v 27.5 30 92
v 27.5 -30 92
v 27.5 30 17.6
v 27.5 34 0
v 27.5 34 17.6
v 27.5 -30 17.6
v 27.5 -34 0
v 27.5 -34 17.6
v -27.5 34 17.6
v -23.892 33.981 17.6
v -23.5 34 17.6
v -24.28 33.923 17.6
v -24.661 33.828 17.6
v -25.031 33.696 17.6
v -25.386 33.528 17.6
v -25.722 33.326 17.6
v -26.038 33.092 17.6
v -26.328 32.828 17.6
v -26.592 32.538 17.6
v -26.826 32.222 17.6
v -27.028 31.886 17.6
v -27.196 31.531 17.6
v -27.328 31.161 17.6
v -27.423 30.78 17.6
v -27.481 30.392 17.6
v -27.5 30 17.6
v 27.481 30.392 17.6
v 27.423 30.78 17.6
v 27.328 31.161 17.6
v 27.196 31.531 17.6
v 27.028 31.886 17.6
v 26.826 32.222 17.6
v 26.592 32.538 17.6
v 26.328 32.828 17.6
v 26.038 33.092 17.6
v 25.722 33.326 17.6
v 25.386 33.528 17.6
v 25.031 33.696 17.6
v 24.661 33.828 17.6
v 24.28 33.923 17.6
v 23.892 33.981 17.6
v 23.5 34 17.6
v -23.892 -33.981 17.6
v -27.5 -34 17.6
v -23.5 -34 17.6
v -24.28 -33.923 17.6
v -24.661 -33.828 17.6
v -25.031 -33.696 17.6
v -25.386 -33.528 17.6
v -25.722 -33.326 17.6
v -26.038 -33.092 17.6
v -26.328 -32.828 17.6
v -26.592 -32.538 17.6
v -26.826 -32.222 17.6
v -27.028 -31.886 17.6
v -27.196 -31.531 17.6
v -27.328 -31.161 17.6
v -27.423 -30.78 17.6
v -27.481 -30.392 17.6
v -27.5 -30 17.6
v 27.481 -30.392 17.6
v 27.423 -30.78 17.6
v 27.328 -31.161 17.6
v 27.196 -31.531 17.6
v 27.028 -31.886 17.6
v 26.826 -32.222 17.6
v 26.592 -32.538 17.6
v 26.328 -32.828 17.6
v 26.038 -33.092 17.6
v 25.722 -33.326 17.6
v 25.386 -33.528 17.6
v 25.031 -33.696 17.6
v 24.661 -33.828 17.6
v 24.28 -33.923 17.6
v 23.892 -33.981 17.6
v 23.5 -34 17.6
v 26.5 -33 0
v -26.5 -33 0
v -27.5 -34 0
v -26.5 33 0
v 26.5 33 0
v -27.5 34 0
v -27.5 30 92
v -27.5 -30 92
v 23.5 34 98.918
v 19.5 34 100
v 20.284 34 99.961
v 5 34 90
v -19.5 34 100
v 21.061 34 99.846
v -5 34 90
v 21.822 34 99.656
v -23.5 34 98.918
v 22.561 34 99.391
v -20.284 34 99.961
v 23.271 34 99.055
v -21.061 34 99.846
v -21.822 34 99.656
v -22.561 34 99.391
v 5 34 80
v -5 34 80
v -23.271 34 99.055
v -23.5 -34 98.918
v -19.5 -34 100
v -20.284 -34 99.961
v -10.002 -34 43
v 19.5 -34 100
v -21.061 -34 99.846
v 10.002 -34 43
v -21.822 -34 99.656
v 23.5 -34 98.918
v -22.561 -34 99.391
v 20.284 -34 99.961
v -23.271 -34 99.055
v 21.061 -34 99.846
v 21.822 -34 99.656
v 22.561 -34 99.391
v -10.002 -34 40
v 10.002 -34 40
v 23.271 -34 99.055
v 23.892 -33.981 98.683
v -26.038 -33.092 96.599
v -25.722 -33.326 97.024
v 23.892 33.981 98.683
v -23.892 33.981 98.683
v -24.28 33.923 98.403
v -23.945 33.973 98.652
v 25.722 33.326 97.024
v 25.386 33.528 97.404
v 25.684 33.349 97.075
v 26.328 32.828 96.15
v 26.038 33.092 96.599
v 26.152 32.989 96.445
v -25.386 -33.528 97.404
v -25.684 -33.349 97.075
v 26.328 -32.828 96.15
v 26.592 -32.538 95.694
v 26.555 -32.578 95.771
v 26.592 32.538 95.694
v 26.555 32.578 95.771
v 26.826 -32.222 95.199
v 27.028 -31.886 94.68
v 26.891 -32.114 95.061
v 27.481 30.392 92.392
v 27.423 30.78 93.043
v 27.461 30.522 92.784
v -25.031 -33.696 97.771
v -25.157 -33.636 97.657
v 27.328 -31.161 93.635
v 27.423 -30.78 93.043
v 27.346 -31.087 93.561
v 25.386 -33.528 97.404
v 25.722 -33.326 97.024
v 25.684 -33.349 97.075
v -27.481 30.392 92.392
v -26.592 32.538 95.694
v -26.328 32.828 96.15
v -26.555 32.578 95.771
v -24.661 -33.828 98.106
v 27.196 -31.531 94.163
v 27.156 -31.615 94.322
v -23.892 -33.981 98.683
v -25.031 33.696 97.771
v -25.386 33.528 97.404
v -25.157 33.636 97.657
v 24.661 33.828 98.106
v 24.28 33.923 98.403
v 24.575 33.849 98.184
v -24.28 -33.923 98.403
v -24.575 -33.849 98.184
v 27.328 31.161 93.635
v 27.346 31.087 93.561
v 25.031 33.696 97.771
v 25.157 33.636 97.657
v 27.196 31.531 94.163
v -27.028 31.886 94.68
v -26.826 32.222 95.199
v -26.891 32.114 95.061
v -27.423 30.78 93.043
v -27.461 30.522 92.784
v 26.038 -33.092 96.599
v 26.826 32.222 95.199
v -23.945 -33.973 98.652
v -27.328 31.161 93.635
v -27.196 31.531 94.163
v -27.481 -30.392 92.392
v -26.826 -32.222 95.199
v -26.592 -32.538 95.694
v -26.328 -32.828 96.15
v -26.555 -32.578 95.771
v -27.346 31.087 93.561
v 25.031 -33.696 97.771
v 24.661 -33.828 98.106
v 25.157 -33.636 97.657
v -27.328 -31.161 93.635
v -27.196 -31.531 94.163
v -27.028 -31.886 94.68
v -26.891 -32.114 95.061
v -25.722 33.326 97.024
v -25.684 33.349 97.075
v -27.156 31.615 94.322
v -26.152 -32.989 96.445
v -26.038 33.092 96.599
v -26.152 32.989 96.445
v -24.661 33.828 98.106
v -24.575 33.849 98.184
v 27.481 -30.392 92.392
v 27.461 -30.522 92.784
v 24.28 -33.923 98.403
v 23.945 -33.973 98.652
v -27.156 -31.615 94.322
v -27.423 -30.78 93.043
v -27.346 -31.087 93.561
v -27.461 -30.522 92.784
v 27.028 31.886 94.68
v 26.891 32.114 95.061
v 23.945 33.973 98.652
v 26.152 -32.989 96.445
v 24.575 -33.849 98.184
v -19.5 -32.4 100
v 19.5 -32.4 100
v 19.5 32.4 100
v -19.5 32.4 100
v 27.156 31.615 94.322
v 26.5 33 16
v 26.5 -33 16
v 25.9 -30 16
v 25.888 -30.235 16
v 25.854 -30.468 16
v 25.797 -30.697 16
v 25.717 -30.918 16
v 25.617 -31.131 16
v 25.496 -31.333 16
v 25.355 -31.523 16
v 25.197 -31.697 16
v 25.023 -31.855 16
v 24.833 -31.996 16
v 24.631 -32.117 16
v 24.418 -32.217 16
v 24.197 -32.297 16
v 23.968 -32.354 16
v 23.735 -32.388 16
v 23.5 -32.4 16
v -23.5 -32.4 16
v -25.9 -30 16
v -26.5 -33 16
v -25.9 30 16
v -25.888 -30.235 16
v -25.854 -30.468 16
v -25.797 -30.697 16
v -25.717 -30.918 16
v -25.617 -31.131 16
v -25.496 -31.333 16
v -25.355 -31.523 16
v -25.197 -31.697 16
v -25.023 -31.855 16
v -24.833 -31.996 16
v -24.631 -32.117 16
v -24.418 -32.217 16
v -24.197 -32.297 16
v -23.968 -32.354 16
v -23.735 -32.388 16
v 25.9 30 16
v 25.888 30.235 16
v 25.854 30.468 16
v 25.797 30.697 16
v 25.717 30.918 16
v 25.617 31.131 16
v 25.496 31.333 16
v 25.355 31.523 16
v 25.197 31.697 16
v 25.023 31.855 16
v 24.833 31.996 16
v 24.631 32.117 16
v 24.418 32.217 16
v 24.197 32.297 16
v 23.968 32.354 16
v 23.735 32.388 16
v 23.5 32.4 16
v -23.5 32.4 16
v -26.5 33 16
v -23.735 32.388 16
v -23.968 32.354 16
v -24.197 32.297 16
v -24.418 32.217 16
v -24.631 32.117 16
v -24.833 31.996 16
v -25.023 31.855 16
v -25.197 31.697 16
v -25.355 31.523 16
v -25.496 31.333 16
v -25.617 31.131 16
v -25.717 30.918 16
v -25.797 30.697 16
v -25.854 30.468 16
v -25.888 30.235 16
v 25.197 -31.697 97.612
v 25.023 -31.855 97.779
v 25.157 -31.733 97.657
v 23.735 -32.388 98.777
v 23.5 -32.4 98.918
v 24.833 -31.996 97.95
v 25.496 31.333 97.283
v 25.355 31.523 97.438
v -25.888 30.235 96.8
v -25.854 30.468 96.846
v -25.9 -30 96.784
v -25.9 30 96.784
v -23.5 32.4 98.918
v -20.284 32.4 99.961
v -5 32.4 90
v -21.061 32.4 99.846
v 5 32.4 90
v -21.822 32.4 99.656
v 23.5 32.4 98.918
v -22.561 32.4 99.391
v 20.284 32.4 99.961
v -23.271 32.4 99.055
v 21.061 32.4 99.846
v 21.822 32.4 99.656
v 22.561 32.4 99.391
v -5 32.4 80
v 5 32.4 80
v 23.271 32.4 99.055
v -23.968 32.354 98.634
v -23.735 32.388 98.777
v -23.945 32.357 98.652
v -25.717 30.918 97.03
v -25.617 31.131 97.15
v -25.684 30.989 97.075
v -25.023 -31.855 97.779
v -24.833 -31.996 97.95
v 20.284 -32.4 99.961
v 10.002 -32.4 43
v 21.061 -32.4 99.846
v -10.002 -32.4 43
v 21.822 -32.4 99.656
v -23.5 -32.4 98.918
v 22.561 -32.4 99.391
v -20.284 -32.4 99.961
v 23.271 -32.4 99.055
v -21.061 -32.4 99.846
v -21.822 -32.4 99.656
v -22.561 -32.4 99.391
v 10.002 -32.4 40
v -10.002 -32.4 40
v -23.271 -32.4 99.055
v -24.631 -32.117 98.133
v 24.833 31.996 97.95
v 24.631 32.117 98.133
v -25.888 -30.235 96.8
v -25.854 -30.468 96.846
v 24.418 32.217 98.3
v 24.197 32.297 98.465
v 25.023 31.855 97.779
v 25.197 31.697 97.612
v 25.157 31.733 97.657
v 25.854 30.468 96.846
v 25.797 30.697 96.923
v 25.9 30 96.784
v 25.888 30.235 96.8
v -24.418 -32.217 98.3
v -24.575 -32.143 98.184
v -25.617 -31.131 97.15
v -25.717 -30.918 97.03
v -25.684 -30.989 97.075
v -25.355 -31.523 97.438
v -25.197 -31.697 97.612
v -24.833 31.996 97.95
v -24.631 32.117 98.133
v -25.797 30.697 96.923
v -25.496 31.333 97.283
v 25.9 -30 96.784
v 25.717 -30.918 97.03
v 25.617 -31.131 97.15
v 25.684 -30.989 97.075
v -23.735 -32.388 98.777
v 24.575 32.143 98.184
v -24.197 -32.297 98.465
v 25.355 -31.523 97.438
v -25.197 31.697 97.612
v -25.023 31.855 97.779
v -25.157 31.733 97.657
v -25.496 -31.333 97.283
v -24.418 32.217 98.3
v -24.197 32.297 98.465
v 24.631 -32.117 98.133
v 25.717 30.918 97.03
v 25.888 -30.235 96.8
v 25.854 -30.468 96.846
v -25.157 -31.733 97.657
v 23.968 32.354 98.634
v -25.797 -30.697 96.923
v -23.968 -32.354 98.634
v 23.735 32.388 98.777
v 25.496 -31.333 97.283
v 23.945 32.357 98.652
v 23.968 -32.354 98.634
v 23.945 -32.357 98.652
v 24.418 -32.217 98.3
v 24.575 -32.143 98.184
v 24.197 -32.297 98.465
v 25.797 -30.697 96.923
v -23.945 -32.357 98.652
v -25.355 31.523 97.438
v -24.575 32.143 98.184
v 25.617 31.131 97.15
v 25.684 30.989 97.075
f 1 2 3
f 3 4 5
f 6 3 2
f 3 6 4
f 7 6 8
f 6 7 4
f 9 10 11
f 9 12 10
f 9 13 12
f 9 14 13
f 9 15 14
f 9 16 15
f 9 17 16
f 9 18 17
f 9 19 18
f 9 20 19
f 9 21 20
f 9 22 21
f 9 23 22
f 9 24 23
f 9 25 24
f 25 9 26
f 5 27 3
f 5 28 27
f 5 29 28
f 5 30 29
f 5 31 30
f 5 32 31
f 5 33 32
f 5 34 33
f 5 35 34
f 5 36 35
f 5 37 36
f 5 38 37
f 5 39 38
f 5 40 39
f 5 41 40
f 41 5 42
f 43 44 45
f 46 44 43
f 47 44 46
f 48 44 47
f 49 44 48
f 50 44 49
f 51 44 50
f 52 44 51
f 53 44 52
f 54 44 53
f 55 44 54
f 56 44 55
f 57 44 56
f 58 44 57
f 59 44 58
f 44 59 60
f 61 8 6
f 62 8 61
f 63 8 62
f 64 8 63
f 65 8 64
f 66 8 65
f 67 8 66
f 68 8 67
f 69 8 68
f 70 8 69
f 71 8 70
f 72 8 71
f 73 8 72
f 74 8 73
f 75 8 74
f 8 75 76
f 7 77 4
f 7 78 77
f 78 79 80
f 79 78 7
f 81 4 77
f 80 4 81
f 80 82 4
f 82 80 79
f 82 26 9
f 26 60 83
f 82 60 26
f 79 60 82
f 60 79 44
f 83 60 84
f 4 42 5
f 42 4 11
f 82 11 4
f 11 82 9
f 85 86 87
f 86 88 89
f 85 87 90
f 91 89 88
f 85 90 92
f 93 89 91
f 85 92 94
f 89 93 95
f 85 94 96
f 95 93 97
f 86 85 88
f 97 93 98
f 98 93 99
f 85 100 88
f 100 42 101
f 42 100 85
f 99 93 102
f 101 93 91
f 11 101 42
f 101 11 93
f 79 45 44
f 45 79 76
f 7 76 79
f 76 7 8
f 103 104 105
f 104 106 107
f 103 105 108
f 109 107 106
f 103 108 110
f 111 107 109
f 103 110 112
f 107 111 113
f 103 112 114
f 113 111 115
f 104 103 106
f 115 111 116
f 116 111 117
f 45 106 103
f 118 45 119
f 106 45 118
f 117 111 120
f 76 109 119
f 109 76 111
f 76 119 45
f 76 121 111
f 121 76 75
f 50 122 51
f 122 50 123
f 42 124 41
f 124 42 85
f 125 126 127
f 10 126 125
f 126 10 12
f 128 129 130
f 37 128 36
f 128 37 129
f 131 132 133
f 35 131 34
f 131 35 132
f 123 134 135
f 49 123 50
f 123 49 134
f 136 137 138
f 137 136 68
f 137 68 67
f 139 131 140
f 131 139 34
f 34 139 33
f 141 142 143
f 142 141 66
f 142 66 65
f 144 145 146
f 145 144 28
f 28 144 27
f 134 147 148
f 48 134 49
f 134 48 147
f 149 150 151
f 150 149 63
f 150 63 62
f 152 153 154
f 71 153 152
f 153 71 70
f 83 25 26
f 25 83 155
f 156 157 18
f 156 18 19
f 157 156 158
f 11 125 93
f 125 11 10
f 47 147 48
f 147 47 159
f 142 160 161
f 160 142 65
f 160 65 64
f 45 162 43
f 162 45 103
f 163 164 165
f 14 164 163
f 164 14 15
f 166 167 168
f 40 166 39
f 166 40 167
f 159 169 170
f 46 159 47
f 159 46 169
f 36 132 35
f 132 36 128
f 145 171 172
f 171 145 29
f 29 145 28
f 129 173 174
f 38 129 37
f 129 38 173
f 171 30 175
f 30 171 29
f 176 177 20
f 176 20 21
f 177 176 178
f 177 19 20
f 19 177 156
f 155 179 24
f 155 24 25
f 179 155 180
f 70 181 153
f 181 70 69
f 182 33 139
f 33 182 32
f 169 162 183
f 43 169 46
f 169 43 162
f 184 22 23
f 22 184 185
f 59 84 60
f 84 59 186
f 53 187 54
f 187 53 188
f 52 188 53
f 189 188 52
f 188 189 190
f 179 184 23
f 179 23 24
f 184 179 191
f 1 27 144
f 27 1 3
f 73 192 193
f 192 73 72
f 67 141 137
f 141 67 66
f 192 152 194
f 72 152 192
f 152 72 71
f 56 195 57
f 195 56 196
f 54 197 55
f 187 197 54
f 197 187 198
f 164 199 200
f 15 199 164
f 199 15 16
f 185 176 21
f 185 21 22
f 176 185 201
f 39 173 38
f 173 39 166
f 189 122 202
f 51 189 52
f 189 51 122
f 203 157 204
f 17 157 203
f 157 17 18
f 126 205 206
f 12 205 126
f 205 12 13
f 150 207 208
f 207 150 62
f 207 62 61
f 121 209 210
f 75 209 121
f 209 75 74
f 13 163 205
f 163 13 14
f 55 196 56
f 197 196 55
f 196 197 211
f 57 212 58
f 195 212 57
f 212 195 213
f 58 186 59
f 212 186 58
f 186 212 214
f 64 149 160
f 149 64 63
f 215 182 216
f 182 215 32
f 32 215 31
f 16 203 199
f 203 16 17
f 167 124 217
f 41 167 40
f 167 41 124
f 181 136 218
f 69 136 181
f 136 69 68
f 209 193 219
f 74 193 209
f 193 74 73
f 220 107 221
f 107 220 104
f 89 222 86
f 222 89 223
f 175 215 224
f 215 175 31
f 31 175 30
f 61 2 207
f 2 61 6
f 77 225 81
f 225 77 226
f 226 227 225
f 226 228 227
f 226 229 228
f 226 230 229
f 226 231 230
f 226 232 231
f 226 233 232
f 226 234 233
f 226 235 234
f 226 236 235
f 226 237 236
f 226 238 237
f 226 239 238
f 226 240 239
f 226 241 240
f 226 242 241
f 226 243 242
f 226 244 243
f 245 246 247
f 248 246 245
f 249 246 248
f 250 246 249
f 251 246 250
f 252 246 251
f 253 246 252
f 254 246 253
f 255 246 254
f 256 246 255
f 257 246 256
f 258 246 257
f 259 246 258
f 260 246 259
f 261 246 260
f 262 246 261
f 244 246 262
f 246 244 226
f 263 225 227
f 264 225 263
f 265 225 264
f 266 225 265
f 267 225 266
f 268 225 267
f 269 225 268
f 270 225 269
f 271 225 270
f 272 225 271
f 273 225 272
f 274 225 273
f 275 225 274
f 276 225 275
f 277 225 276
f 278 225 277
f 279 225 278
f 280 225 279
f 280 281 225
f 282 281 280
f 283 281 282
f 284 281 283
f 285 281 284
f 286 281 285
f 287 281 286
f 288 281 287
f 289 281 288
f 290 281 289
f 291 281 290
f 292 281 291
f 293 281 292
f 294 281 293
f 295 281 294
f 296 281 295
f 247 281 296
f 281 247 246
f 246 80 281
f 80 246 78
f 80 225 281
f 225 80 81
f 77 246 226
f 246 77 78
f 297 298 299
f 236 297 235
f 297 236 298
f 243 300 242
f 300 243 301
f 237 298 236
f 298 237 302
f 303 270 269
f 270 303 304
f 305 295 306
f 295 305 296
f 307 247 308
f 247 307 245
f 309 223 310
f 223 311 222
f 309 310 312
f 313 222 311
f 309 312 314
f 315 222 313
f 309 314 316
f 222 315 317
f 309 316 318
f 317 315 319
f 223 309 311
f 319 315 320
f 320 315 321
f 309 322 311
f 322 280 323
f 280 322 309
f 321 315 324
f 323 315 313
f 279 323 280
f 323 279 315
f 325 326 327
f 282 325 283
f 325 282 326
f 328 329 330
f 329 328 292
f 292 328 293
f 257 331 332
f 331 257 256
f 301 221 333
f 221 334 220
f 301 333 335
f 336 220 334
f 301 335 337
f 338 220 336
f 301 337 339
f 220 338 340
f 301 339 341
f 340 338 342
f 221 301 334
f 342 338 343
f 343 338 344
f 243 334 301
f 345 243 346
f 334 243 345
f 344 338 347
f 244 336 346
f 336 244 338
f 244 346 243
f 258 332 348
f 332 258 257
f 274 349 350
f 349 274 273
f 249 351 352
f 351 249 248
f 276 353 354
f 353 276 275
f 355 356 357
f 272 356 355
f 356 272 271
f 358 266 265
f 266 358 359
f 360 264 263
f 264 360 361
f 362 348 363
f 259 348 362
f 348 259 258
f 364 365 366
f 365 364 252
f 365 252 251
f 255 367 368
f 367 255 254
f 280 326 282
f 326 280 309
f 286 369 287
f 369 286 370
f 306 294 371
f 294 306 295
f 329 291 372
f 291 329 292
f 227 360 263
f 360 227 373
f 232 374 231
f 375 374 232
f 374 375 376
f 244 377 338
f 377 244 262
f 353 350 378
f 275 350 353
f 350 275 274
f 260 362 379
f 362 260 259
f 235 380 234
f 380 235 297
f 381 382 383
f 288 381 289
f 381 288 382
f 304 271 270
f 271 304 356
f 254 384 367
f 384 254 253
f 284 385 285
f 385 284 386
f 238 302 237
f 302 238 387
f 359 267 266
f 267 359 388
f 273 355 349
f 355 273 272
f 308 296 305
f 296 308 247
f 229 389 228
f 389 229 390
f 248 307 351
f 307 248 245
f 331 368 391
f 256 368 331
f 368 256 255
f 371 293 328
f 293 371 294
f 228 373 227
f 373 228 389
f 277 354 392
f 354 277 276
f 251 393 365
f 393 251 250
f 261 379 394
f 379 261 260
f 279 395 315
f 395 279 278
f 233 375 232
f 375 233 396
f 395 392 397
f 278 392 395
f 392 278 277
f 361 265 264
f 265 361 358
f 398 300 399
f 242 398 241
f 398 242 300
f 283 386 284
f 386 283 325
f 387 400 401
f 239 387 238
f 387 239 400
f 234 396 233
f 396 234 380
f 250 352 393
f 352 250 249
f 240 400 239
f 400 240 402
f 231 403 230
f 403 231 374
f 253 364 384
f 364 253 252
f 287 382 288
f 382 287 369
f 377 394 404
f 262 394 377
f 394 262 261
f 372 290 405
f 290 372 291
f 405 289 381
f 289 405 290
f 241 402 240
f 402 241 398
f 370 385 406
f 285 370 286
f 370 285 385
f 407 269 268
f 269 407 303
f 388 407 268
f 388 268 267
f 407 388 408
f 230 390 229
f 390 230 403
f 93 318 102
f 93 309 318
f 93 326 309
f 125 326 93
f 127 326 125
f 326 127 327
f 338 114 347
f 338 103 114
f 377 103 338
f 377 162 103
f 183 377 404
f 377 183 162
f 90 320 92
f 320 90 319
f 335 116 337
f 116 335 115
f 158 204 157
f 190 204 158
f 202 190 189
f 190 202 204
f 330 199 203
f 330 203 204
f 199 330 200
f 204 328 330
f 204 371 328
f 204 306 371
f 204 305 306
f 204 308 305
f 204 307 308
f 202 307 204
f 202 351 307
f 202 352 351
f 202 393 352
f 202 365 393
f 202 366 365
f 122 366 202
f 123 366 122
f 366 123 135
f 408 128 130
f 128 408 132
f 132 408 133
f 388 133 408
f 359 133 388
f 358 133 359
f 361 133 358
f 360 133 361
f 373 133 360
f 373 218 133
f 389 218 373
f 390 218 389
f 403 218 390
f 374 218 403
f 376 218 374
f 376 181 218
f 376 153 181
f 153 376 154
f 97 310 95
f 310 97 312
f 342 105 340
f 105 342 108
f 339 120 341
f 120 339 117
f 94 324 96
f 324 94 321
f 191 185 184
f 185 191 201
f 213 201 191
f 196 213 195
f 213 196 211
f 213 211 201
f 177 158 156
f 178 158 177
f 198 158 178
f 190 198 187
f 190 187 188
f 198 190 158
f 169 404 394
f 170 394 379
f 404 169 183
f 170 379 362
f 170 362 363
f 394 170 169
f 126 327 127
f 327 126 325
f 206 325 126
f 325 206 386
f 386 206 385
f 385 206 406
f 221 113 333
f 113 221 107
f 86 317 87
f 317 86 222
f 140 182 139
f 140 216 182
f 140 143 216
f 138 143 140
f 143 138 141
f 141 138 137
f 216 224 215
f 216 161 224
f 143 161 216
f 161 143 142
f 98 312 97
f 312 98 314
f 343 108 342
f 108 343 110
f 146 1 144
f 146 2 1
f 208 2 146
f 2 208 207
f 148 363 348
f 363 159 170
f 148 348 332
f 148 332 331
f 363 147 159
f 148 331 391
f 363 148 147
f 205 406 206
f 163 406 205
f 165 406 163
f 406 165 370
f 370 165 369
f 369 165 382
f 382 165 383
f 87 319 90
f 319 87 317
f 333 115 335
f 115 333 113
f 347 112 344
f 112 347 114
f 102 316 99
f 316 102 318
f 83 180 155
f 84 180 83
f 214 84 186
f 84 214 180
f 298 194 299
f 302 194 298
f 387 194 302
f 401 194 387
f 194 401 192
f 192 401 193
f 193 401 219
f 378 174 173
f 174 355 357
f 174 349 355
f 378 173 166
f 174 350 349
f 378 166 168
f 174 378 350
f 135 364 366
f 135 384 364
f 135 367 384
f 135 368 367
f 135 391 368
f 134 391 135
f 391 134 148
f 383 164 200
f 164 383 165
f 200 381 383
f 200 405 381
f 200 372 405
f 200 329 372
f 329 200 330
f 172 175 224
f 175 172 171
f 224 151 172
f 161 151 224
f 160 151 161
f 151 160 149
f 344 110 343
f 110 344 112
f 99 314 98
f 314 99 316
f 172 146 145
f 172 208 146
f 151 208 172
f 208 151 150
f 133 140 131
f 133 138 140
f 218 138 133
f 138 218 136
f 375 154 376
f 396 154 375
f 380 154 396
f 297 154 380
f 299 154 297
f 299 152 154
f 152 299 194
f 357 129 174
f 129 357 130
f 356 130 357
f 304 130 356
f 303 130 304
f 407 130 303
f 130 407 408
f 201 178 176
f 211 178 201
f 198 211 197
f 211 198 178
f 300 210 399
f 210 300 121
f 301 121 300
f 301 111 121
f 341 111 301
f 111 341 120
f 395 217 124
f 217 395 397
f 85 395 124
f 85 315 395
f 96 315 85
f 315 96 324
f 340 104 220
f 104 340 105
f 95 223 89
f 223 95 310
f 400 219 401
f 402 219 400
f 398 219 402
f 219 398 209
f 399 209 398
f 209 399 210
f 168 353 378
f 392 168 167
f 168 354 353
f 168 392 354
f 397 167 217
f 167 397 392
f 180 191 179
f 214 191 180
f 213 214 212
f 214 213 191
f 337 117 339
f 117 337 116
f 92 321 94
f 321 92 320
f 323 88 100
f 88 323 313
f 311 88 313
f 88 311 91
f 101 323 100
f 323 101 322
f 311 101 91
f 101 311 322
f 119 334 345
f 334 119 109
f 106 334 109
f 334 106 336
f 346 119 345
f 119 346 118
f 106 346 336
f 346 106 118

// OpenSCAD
// Open-top body alternative, millimetres. Front = -Y, rear = +Y.
// The original 50 mm body plus the requested 50 mm raised rim totals 100 mm.
width = 55;
depth = 68;
body_height = 50;
rim_height = 50;
height = body_height + rim_height;
wall = 1.6;
base_wall = 1;
base_band = 16;
corner_radius = 4;
top_corner_radius = 8;
usb_size = 10;
usb_top_offset = 10;
oled_slot_width = 20.005;
oled_slot_height = 3;
oled_slot_z = 40;
$fn = 64;

module rounded_rectangle(w, d, r) {
    offset(r=r) square([w-2*r, d-2*r], center=true);
}

// Rounded upper corners seen from the face; sides remain vertical below them.
module crown_profile() {
    translate([0,depth/2+1,0]) rotate([90,0,0])
        linear_extrude(height=depth+2)
            hull() {
                translate([-width/2,0]) square([width,1]);
                for(x=[-width/2+top_corner_radius, width/2-top_corner_radius])
                    translate([x,height-top_corner_radius]) circle(r=top_corner_radius);
            }
}

module shell() {
    difference() {
        union() {
            // Square lower collar preserves the nominal original cavity.
            translate([-width/2,-depth/2,0]) cube([width,depth,base_band+wall]);
            translate([0,0,base_band+wall]) linear_extrude(height=height-base_band-wall)
                rounded_rectangle(width,depth,corner_radius);
        }
        translate([-width/2+base_wall,-depth/2+base_wall,-1])
            cube([width-2*base_wall,depth-2*base_wall,base_band+1]);
        translate([0,0,base_band]) linear_extrude(height=height-base_band+1)
            rounded_rectangle(width-2*wall,depth-2*wall,corner_radius-wall);
    }
}

difference() {
    intersection() { shell(); crown_profile(); }
    // Rear USB square, upper edge 10 mm below the highest rim edge.
    translate([-usb_size/2,depth/2-wall-1,height-usb_top_offset-usb_size])
        cube([usb_size,wall+2,usb_size]);
    // Original-style cable slot: OLED board mounts externally, not behind a window.
    translate([-oled_slot_width/2,-depth/2-1,oled_slot_z])
        cube([oled_slot_width,wall+2,oled_slot_height]);
}
